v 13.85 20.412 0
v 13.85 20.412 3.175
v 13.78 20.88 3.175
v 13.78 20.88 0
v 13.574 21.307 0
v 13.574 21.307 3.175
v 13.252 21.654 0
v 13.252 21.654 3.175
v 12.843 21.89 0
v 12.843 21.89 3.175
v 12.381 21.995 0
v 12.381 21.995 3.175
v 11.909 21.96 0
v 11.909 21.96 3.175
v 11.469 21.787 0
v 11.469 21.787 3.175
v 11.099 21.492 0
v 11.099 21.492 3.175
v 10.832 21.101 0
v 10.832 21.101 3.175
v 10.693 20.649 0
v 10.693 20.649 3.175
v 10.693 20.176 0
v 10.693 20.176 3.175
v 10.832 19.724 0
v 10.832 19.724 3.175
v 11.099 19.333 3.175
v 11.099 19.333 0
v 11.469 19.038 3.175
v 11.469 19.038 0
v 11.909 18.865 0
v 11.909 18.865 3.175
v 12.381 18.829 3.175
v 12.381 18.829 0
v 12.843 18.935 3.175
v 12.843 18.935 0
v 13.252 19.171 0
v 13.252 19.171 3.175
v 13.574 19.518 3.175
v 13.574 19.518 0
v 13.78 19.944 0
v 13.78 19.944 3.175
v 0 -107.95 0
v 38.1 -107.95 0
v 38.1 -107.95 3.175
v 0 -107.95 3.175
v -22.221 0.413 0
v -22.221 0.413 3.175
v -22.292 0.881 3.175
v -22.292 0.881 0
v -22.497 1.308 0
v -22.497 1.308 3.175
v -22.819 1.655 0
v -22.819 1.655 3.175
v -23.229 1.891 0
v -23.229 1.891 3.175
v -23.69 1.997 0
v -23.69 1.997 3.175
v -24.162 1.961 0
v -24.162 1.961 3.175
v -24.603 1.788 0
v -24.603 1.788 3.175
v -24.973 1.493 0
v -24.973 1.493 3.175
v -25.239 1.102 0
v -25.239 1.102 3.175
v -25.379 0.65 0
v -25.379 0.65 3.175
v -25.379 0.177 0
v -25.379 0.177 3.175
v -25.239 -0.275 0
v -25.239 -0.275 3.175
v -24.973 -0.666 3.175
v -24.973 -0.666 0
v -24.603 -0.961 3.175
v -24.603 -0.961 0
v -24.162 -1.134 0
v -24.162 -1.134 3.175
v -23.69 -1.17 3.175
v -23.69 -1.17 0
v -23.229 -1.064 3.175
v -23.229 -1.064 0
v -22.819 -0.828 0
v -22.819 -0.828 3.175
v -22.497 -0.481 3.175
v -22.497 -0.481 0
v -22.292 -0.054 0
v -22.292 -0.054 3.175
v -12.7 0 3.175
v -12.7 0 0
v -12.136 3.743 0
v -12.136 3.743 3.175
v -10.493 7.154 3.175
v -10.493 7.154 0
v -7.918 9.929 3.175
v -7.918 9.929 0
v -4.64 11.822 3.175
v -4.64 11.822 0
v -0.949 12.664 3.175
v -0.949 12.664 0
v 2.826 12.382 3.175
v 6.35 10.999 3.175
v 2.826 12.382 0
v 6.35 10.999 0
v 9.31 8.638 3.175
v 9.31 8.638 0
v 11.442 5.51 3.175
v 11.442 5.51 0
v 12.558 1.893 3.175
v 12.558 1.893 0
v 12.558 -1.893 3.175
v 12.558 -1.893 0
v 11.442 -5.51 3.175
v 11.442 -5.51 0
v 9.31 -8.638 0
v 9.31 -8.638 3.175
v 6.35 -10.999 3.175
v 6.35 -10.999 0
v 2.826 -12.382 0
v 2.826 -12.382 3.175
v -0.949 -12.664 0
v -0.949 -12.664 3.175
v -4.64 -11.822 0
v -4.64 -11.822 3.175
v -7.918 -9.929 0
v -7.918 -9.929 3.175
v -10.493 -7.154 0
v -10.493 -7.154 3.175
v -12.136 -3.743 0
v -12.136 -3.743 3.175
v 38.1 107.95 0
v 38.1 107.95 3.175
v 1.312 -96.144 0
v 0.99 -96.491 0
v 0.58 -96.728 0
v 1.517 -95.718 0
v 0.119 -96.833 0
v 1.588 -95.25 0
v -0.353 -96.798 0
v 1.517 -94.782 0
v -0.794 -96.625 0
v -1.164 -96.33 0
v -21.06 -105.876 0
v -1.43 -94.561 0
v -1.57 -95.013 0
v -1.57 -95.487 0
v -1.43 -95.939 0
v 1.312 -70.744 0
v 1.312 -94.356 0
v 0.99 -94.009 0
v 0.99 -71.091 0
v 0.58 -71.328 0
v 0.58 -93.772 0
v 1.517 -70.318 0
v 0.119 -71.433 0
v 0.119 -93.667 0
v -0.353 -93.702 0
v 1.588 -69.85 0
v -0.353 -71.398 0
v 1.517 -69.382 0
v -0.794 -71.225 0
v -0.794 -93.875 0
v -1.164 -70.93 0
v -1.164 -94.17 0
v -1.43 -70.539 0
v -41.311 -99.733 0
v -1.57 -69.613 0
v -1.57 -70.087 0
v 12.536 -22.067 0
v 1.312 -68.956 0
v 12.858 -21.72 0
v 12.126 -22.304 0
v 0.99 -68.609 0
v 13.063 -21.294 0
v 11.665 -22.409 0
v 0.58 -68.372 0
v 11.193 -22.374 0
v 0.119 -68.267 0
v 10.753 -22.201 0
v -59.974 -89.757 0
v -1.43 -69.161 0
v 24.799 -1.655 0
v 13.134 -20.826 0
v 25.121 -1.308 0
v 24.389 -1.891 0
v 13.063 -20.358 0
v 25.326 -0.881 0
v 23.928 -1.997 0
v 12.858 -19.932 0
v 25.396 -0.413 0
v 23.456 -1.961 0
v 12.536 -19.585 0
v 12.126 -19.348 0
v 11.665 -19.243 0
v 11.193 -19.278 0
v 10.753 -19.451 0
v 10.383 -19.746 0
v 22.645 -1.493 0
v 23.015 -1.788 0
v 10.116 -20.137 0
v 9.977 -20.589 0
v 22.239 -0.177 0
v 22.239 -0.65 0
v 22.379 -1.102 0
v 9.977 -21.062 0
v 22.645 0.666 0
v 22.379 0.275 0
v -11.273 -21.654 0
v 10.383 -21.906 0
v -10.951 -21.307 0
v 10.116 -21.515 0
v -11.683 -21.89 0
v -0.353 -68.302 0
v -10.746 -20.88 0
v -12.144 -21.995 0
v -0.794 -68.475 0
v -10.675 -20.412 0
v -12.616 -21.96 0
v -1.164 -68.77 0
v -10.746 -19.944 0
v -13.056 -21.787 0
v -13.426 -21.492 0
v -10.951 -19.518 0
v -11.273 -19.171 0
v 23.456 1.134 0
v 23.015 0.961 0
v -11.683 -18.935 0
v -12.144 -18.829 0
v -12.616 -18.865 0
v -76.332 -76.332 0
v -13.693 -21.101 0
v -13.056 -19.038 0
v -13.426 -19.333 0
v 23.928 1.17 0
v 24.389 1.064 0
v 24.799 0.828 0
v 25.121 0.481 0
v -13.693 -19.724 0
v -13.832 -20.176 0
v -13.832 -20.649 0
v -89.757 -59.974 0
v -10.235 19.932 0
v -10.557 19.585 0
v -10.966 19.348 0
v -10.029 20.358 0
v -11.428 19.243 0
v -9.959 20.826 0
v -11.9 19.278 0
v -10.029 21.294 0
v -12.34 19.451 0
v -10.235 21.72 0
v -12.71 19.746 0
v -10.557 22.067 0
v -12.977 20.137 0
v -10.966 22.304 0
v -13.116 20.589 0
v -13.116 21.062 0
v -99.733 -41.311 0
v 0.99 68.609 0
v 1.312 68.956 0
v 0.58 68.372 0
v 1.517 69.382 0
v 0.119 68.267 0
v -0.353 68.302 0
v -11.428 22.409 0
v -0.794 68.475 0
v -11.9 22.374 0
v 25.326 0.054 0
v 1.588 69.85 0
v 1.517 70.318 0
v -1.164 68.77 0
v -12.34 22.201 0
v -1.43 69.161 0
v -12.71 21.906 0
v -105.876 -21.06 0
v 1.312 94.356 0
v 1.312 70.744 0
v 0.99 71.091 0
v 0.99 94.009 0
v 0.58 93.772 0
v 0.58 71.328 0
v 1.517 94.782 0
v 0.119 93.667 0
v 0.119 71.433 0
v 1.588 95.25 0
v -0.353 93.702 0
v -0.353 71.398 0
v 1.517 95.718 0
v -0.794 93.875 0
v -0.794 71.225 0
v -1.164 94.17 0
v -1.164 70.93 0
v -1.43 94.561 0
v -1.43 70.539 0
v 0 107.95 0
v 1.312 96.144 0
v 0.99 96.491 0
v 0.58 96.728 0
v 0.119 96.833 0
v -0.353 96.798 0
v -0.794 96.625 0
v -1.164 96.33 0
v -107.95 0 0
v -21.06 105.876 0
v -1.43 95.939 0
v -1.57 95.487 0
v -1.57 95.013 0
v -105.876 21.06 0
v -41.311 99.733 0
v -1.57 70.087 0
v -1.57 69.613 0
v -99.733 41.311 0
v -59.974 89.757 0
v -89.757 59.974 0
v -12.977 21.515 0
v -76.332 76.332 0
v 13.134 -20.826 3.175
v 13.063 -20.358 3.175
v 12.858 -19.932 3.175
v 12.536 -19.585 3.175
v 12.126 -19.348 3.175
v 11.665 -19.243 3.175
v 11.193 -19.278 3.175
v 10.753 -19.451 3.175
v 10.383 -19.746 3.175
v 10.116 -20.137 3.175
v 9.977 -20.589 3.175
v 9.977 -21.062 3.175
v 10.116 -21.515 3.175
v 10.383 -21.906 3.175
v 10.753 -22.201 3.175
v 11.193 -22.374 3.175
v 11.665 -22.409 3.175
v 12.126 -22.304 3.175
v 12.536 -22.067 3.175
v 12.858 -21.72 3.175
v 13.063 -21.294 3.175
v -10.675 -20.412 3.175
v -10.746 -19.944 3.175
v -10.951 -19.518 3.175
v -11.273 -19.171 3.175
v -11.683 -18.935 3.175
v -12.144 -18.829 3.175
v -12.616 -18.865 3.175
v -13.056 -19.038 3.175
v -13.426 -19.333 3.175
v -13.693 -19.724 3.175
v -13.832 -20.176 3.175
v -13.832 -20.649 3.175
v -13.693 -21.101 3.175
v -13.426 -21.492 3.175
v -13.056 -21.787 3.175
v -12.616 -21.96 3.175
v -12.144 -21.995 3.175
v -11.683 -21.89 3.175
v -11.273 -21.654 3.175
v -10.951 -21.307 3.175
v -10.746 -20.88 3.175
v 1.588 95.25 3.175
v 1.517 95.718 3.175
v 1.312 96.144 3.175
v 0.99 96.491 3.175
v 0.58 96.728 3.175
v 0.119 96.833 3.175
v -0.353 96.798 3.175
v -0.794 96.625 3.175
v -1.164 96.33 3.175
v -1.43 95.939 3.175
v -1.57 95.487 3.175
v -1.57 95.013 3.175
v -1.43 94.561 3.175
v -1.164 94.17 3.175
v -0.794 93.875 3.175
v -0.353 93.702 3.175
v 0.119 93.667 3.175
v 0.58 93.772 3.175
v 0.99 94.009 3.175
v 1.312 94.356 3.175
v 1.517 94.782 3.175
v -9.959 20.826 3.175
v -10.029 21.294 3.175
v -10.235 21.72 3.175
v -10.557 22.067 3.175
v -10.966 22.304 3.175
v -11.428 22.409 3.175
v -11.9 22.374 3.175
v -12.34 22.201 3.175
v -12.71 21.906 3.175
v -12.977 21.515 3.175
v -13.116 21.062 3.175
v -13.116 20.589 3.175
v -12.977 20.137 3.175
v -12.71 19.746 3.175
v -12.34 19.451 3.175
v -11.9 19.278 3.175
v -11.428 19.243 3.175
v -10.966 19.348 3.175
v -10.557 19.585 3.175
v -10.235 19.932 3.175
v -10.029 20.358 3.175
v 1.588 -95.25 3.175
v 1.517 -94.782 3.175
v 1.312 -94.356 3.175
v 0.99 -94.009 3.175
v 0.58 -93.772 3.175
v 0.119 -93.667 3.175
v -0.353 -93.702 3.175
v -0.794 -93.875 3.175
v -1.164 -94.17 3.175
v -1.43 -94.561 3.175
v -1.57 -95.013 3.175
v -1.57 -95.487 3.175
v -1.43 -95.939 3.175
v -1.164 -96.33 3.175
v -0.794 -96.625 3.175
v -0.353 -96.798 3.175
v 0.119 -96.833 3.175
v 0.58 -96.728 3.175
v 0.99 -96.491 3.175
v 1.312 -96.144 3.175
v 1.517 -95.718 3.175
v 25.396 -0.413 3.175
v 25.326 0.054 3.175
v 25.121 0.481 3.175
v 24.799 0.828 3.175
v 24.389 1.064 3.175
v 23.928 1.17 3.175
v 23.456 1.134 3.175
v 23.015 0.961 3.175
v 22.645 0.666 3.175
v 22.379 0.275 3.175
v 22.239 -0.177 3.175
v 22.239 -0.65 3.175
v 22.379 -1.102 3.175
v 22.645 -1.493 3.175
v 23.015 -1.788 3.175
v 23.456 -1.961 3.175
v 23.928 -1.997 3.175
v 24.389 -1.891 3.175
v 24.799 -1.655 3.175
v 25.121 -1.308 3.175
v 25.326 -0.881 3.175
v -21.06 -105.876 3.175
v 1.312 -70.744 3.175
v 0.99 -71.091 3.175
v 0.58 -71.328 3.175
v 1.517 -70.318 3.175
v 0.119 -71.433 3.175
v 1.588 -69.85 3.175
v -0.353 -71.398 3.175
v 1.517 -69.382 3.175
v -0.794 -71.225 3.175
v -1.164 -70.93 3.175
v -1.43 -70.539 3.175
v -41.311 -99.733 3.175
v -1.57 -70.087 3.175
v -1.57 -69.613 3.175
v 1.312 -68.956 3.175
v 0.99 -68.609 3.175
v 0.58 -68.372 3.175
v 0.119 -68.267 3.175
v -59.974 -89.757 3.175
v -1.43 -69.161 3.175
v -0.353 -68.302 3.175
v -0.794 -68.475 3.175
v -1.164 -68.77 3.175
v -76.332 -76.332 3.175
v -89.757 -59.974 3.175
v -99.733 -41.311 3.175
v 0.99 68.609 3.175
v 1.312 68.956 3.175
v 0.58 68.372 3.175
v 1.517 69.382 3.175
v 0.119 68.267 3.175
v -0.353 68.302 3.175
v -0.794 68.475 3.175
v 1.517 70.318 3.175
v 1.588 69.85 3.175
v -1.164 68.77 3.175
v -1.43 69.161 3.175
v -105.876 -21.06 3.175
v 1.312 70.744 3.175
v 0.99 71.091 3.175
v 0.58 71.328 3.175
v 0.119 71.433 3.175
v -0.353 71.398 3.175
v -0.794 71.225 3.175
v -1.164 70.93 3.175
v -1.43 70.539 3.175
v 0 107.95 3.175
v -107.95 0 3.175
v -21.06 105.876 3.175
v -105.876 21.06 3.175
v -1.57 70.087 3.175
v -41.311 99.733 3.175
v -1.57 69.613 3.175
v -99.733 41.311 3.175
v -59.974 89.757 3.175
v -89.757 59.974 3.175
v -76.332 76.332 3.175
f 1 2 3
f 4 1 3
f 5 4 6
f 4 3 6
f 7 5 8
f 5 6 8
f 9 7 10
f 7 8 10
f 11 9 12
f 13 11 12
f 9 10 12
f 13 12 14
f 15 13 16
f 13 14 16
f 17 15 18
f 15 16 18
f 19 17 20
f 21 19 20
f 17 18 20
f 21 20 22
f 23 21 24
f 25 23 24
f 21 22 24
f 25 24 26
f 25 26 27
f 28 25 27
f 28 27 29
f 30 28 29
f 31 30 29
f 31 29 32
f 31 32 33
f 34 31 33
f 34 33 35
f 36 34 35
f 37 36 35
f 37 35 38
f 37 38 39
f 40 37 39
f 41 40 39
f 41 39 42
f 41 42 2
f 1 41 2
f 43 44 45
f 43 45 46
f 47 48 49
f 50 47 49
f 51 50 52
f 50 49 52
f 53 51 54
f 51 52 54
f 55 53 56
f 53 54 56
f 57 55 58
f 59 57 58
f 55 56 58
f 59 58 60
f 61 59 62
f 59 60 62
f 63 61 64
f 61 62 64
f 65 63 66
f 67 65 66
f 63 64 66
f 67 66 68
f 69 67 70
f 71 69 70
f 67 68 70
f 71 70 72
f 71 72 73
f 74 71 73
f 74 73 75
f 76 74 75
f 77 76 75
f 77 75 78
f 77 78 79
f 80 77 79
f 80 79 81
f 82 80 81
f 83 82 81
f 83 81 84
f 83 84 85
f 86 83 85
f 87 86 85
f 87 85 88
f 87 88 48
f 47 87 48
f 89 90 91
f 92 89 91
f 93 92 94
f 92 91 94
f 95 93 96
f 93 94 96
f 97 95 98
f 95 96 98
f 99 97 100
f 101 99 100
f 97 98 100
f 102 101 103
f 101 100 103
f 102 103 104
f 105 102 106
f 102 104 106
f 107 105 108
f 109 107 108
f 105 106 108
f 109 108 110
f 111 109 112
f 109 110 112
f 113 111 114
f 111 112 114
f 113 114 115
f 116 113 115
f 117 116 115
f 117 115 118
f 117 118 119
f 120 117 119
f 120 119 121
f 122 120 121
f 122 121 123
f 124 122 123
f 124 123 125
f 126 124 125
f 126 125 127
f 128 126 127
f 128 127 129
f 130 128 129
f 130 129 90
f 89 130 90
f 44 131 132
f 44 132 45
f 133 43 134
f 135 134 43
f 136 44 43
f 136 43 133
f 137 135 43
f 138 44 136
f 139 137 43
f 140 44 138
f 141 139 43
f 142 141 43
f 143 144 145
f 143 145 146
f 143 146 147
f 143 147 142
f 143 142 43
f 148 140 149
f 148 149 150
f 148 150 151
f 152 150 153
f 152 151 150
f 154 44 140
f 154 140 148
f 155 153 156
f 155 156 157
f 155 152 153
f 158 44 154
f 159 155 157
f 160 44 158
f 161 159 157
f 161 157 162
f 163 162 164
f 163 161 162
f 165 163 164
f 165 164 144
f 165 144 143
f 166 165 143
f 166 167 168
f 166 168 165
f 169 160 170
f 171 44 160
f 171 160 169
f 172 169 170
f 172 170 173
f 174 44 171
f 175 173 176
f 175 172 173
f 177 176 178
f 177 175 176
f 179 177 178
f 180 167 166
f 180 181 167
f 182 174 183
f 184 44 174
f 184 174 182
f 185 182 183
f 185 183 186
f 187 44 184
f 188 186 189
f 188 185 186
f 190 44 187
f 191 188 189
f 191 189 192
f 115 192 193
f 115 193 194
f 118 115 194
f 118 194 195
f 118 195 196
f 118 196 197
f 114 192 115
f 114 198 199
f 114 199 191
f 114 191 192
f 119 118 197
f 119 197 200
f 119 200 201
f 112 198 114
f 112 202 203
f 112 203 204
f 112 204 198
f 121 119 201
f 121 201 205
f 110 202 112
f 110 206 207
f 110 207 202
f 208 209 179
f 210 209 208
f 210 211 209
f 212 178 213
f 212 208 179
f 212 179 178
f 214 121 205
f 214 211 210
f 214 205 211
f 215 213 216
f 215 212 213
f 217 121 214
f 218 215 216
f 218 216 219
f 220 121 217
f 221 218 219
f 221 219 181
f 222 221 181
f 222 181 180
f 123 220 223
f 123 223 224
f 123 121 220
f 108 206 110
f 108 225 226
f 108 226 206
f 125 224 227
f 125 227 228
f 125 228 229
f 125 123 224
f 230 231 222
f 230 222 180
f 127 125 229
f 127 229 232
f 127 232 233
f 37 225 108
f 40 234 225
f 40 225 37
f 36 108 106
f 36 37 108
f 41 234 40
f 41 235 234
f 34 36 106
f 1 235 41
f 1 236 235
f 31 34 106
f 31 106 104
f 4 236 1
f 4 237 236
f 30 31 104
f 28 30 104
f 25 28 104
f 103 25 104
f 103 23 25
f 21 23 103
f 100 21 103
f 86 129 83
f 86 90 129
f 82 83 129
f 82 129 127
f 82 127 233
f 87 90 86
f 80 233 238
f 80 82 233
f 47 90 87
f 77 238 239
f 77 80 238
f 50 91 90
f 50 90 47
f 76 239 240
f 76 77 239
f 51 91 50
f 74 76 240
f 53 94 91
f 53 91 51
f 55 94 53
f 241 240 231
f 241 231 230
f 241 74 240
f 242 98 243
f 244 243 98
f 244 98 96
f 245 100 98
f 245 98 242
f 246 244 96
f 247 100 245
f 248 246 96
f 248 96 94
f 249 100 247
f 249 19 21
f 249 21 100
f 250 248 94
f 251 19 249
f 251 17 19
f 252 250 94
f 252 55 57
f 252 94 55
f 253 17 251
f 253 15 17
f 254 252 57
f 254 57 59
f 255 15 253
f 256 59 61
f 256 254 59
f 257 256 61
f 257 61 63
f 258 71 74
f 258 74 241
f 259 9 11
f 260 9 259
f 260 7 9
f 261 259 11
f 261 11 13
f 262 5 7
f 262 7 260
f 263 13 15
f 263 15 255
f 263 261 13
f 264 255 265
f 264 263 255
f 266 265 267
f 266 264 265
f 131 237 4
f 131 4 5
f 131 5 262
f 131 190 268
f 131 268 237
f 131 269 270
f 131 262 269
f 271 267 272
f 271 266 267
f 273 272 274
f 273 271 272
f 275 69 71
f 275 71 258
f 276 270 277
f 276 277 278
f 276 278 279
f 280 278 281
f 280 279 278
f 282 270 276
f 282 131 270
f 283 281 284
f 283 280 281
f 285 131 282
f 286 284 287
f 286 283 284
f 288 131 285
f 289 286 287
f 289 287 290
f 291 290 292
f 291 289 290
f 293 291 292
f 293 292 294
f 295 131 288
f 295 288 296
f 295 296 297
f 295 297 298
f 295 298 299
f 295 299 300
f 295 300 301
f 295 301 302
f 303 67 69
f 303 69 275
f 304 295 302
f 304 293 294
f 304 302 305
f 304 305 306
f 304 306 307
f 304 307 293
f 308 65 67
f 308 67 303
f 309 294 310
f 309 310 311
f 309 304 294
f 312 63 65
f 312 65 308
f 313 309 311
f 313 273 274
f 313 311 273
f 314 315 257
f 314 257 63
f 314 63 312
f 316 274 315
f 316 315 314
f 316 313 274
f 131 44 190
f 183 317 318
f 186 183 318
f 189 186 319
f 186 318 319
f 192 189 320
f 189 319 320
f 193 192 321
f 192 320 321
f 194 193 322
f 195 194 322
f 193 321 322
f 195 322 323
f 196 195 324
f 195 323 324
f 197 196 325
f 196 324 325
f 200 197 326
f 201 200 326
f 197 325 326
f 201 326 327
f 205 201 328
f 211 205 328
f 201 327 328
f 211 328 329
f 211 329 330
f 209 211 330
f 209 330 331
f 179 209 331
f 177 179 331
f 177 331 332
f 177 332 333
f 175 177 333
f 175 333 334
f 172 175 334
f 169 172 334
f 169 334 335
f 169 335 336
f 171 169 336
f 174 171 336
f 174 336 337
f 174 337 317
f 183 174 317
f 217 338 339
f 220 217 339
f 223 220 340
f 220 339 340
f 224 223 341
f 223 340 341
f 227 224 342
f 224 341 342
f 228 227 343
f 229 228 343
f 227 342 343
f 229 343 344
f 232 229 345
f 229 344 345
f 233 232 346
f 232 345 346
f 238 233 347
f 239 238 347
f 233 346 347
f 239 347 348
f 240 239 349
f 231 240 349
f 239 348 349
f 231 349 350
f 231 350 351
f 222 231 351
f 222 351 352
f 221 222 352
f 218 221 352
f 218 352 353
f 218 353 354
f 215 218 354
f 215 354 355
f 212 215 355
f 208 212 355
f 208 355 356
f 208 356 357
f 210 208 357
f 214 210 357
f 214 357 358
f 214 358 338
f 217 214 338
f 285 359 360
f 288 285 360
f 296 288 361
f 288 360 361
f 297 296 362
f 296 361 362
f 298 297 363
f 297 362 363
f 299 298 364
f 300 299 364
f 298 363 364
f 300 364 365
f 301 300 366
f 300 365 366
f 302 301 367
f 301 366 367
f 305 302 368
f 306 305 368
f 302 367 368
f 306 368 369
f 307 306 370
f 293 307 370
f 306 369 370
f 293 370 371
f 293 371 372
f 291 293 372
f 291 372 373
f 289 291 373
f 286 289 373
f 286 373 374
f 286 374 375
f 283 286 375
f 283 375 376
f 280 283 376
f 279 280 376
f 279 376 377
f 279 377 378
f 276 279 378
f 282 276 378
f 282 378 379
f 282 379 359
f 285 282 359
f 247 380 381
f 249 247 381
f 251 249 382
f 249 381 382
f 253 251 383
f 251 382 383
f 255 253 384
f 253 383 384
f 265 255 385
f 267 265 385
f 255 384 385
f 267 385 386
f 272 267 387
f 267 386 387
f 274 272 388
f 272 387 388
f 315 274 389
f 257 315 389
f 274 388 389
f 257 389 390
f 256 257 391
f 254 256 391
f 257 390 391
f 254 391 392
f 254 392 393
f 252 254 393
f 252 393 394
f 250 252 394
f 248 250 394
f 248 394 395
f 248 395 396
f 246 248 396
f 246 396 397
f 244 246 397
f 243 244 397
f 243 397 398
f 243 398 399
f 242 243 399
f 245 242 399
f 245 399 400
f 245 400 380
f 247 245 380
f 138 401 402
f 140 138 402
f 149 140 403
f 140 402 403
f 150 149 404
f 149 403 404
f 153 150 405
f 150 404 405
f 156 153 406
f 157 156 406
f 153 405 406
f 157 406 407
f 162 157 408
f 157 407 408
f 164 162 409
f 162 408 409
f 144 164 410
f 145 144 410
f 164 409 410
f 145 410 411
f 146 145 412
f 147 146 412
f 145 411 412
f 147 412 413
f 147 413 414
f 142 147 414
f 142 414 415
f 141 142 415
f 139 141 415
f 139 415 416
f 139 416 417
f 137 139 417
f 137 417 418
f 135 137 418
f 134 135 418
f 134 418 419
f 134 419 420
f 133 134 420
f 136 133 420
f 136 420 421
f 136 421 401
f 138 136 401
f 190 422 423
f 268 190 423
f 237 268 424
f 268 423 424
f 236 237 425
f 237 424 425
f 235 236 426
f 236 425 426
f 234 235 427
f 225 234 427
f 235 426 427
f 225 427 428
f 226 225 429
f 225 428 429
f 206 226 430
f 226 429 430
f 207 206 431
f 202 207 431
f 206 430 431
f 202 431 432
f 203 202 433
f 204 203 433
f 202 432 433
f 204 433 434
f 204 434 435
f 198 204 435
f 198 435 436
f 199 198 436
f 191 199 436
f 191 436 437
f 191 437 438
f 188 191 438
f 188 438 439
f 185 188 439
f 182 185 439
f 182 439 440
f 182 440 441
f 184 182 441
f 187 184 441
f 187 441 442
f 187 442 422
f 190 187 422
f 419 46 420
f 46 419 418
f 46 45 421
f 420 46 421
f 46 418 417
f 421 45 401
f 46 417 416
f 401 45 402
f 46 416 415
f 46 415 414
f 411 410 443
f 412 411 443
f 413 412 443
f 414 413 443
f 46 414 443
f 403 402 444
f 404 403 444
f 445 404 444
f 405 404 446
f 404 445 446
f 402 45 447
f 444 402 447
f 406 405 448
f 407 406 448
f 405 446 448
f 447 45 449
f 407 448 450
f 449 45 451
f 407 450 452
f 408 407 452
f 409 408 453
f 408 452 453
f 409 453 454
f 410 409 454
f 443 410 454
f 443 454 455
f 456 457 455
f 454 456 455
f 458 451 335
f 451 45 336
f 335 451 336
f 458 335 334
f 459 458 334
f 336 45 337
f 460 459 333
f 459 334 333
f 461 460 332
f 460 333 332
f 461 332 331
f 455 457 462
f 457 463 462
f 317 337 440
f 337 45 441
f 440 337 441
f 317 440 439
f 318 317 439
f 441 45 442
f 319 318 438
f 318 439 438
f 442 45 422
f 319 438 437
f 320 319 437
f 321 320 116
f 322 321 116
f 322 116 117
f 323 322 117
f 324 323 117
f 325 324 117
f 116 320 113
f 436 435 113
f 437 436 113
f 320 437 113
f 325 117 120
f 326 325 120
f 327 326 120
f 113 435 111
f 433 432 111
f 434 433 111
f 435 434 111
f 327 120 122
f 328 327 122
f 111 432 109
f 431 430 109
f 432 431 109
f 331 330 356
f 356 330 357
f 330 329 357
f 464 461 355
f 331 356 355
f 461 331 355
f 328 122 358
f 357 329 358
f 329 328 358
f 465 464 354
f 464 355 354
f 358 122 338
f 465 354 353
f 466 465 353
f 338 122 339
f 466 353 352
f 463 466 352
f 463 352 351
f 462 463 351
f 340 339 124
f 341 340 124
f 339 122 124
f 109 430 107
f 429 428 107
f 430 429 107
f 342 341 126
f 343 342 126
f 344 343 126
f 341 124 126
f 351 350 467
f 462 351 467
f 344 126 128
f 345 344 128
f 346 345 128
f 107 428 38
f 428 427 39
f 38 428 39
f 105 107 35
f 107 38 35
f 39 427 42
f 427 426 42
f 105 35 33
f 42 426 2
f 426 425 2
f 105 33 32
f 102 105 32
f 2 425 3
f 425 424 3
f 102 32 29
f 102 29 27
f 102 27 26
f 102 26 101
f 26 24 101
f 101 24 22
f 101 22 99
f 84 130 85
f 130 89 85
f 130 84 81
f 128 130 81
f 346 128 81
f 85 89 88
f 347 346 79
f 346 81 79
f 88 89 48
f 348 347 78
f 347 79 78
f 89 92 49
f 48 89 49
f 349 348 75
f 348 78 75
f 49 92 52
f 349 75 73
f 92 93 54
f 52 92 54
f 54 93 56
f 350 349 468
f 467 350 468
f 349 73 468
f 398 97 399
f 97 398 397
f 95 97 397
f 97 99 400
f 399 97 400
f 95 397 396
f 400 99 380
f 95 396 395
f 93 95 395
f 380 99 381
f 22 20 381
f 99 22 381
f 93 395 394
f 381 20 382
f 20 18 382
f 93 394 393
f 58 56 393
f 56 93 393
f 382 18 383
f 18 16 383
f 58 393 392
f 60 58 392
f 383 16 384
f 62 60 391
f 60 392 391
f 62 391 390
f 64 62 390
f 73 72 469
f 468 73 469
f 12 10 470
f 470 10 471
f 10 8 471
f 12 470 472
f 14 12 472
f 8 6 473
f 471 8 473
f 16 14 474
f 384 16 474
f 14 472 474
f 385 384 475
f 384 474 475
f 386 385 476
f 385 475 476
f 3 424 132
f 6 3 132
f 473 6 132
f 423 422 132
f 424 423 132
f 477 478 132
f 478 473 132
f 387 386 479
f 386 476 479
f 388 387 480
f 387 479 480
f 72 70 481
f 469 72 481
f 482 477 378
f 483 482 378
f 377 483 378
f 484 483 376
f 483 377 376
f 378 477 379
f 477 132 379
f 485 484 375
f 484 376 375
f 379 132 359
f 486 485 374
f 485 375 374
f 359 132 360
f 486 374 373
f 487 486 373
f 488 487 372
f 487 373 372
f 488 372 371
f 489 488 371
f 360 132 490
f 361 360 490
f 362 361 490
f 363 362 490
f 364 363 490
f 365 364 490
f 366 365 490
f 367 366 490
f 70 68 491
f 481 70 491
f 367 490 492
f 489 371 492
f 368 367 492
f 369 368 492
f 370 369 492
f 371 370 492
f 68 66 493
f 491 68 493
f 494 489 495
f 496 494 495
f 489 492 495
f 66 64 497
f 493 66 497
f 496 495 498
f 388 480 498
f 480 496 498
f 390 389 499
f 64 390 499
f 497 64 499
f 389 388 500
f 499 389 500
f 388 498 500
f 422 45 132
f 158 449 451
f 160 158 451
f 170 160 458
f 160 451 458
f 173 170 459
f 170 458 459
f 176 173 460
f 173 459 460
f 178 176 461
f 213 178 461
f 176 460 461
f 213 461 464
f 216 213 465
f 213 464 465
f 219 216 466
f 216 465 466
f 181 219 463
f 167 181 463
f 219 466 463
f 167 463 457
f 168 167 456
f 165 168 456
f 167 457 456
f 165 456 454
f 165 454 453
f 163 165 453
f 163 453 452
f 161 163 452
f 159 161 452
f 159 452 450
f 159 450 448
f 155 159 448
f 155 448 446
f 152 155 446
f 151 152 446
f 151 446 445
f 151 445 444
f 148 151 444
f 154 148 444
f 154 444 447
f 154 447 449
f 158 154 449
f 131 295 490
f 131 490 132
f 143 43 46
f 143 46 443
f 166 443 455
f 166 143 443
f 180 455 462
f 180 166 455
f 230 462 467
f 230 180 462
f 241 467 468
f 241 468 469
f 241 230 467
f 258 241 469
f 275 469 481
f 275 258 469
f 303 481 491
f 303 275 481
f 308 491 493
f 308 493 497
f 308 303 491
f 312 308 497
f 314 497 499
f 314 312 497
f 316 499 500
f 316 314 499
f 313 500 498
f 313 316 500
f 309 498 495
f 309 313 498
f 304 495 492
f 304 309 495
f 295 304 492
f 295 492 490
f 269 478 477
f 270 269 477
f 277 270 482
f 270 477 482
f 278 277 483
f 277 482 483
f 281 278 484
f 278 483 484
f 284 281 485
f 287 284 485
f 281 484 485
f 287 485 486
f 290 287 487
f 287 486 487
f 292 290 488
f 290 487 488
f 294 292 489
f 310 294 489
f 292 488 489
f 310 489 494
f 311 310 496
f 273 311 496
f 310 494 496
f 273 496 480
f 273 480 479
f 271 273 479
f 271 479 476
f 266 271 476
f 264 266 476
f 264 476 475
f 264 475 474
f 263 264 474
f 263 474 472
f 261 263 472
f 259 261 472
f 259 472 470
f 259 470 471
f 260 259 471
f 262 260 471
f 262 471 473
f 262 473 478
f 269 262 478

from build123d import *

# Parameters (mm, degrees)
BOSS_EXTRUDE1_DEPTH          = 3.175
F_1_8_0_125_DIAMETER_HOLE1_D = 3.175
SKETCH6_R                    = 12.7
CUT_EXTRUDE1_DEPTH           = 17.0815


with BuildPart() as part:
    # Sketch1 → Boss-Extrude1 (new body)
    with BuildSketch(Plane.XY):
        with BuildLine():
            Line((0, 107.95), (38.1, 107.95))
            Line((38.1, 107.95), (38.1, -107.95))
            Line((38.1, -107.95), (0, -107.95))
            ThreePointArc((0, -107.95), (-107.95, 0), (0, 107.95))
        make_face()
    extrude(amount=BOSS_EXTRUDE1_DEPTH)

    # 1/8 (0.125) Diameter Hole1 (through all)
    with Locations(Plane(origin=(0, 0, 0), x_dir=(-1, 0, 0), z_dir=(0, 0, -1))):
        with Locations((12.262546259, -20.412376527), (0, 95.25), (0, -95.25), (0, -69.85), (0, 69.85), (0, 0), (23.808909754, 0.413488312), (11.546363494, 20.825864839), (-12.262546259, 20.412376527), (-23.808909754, -0.413488312), (-11.546363494, -20.825864839)):
            Hole(F_1_8_0_125_DIAMETER_HOLE1_D / 2)

    # Sketch6 → Cut-Extrude1 (cut)
    with BuildSketch(Plane(origin=(0, 0, 0), x_dir=(-1, 0, 0), z_dir=(0, 0, -1))):
        Circle(SKETCH6_R)
    extrude(amount=-CUT_EXTRUDE1_DEPTH, mode=Mode.SUBTRACT)


solid = part.part
